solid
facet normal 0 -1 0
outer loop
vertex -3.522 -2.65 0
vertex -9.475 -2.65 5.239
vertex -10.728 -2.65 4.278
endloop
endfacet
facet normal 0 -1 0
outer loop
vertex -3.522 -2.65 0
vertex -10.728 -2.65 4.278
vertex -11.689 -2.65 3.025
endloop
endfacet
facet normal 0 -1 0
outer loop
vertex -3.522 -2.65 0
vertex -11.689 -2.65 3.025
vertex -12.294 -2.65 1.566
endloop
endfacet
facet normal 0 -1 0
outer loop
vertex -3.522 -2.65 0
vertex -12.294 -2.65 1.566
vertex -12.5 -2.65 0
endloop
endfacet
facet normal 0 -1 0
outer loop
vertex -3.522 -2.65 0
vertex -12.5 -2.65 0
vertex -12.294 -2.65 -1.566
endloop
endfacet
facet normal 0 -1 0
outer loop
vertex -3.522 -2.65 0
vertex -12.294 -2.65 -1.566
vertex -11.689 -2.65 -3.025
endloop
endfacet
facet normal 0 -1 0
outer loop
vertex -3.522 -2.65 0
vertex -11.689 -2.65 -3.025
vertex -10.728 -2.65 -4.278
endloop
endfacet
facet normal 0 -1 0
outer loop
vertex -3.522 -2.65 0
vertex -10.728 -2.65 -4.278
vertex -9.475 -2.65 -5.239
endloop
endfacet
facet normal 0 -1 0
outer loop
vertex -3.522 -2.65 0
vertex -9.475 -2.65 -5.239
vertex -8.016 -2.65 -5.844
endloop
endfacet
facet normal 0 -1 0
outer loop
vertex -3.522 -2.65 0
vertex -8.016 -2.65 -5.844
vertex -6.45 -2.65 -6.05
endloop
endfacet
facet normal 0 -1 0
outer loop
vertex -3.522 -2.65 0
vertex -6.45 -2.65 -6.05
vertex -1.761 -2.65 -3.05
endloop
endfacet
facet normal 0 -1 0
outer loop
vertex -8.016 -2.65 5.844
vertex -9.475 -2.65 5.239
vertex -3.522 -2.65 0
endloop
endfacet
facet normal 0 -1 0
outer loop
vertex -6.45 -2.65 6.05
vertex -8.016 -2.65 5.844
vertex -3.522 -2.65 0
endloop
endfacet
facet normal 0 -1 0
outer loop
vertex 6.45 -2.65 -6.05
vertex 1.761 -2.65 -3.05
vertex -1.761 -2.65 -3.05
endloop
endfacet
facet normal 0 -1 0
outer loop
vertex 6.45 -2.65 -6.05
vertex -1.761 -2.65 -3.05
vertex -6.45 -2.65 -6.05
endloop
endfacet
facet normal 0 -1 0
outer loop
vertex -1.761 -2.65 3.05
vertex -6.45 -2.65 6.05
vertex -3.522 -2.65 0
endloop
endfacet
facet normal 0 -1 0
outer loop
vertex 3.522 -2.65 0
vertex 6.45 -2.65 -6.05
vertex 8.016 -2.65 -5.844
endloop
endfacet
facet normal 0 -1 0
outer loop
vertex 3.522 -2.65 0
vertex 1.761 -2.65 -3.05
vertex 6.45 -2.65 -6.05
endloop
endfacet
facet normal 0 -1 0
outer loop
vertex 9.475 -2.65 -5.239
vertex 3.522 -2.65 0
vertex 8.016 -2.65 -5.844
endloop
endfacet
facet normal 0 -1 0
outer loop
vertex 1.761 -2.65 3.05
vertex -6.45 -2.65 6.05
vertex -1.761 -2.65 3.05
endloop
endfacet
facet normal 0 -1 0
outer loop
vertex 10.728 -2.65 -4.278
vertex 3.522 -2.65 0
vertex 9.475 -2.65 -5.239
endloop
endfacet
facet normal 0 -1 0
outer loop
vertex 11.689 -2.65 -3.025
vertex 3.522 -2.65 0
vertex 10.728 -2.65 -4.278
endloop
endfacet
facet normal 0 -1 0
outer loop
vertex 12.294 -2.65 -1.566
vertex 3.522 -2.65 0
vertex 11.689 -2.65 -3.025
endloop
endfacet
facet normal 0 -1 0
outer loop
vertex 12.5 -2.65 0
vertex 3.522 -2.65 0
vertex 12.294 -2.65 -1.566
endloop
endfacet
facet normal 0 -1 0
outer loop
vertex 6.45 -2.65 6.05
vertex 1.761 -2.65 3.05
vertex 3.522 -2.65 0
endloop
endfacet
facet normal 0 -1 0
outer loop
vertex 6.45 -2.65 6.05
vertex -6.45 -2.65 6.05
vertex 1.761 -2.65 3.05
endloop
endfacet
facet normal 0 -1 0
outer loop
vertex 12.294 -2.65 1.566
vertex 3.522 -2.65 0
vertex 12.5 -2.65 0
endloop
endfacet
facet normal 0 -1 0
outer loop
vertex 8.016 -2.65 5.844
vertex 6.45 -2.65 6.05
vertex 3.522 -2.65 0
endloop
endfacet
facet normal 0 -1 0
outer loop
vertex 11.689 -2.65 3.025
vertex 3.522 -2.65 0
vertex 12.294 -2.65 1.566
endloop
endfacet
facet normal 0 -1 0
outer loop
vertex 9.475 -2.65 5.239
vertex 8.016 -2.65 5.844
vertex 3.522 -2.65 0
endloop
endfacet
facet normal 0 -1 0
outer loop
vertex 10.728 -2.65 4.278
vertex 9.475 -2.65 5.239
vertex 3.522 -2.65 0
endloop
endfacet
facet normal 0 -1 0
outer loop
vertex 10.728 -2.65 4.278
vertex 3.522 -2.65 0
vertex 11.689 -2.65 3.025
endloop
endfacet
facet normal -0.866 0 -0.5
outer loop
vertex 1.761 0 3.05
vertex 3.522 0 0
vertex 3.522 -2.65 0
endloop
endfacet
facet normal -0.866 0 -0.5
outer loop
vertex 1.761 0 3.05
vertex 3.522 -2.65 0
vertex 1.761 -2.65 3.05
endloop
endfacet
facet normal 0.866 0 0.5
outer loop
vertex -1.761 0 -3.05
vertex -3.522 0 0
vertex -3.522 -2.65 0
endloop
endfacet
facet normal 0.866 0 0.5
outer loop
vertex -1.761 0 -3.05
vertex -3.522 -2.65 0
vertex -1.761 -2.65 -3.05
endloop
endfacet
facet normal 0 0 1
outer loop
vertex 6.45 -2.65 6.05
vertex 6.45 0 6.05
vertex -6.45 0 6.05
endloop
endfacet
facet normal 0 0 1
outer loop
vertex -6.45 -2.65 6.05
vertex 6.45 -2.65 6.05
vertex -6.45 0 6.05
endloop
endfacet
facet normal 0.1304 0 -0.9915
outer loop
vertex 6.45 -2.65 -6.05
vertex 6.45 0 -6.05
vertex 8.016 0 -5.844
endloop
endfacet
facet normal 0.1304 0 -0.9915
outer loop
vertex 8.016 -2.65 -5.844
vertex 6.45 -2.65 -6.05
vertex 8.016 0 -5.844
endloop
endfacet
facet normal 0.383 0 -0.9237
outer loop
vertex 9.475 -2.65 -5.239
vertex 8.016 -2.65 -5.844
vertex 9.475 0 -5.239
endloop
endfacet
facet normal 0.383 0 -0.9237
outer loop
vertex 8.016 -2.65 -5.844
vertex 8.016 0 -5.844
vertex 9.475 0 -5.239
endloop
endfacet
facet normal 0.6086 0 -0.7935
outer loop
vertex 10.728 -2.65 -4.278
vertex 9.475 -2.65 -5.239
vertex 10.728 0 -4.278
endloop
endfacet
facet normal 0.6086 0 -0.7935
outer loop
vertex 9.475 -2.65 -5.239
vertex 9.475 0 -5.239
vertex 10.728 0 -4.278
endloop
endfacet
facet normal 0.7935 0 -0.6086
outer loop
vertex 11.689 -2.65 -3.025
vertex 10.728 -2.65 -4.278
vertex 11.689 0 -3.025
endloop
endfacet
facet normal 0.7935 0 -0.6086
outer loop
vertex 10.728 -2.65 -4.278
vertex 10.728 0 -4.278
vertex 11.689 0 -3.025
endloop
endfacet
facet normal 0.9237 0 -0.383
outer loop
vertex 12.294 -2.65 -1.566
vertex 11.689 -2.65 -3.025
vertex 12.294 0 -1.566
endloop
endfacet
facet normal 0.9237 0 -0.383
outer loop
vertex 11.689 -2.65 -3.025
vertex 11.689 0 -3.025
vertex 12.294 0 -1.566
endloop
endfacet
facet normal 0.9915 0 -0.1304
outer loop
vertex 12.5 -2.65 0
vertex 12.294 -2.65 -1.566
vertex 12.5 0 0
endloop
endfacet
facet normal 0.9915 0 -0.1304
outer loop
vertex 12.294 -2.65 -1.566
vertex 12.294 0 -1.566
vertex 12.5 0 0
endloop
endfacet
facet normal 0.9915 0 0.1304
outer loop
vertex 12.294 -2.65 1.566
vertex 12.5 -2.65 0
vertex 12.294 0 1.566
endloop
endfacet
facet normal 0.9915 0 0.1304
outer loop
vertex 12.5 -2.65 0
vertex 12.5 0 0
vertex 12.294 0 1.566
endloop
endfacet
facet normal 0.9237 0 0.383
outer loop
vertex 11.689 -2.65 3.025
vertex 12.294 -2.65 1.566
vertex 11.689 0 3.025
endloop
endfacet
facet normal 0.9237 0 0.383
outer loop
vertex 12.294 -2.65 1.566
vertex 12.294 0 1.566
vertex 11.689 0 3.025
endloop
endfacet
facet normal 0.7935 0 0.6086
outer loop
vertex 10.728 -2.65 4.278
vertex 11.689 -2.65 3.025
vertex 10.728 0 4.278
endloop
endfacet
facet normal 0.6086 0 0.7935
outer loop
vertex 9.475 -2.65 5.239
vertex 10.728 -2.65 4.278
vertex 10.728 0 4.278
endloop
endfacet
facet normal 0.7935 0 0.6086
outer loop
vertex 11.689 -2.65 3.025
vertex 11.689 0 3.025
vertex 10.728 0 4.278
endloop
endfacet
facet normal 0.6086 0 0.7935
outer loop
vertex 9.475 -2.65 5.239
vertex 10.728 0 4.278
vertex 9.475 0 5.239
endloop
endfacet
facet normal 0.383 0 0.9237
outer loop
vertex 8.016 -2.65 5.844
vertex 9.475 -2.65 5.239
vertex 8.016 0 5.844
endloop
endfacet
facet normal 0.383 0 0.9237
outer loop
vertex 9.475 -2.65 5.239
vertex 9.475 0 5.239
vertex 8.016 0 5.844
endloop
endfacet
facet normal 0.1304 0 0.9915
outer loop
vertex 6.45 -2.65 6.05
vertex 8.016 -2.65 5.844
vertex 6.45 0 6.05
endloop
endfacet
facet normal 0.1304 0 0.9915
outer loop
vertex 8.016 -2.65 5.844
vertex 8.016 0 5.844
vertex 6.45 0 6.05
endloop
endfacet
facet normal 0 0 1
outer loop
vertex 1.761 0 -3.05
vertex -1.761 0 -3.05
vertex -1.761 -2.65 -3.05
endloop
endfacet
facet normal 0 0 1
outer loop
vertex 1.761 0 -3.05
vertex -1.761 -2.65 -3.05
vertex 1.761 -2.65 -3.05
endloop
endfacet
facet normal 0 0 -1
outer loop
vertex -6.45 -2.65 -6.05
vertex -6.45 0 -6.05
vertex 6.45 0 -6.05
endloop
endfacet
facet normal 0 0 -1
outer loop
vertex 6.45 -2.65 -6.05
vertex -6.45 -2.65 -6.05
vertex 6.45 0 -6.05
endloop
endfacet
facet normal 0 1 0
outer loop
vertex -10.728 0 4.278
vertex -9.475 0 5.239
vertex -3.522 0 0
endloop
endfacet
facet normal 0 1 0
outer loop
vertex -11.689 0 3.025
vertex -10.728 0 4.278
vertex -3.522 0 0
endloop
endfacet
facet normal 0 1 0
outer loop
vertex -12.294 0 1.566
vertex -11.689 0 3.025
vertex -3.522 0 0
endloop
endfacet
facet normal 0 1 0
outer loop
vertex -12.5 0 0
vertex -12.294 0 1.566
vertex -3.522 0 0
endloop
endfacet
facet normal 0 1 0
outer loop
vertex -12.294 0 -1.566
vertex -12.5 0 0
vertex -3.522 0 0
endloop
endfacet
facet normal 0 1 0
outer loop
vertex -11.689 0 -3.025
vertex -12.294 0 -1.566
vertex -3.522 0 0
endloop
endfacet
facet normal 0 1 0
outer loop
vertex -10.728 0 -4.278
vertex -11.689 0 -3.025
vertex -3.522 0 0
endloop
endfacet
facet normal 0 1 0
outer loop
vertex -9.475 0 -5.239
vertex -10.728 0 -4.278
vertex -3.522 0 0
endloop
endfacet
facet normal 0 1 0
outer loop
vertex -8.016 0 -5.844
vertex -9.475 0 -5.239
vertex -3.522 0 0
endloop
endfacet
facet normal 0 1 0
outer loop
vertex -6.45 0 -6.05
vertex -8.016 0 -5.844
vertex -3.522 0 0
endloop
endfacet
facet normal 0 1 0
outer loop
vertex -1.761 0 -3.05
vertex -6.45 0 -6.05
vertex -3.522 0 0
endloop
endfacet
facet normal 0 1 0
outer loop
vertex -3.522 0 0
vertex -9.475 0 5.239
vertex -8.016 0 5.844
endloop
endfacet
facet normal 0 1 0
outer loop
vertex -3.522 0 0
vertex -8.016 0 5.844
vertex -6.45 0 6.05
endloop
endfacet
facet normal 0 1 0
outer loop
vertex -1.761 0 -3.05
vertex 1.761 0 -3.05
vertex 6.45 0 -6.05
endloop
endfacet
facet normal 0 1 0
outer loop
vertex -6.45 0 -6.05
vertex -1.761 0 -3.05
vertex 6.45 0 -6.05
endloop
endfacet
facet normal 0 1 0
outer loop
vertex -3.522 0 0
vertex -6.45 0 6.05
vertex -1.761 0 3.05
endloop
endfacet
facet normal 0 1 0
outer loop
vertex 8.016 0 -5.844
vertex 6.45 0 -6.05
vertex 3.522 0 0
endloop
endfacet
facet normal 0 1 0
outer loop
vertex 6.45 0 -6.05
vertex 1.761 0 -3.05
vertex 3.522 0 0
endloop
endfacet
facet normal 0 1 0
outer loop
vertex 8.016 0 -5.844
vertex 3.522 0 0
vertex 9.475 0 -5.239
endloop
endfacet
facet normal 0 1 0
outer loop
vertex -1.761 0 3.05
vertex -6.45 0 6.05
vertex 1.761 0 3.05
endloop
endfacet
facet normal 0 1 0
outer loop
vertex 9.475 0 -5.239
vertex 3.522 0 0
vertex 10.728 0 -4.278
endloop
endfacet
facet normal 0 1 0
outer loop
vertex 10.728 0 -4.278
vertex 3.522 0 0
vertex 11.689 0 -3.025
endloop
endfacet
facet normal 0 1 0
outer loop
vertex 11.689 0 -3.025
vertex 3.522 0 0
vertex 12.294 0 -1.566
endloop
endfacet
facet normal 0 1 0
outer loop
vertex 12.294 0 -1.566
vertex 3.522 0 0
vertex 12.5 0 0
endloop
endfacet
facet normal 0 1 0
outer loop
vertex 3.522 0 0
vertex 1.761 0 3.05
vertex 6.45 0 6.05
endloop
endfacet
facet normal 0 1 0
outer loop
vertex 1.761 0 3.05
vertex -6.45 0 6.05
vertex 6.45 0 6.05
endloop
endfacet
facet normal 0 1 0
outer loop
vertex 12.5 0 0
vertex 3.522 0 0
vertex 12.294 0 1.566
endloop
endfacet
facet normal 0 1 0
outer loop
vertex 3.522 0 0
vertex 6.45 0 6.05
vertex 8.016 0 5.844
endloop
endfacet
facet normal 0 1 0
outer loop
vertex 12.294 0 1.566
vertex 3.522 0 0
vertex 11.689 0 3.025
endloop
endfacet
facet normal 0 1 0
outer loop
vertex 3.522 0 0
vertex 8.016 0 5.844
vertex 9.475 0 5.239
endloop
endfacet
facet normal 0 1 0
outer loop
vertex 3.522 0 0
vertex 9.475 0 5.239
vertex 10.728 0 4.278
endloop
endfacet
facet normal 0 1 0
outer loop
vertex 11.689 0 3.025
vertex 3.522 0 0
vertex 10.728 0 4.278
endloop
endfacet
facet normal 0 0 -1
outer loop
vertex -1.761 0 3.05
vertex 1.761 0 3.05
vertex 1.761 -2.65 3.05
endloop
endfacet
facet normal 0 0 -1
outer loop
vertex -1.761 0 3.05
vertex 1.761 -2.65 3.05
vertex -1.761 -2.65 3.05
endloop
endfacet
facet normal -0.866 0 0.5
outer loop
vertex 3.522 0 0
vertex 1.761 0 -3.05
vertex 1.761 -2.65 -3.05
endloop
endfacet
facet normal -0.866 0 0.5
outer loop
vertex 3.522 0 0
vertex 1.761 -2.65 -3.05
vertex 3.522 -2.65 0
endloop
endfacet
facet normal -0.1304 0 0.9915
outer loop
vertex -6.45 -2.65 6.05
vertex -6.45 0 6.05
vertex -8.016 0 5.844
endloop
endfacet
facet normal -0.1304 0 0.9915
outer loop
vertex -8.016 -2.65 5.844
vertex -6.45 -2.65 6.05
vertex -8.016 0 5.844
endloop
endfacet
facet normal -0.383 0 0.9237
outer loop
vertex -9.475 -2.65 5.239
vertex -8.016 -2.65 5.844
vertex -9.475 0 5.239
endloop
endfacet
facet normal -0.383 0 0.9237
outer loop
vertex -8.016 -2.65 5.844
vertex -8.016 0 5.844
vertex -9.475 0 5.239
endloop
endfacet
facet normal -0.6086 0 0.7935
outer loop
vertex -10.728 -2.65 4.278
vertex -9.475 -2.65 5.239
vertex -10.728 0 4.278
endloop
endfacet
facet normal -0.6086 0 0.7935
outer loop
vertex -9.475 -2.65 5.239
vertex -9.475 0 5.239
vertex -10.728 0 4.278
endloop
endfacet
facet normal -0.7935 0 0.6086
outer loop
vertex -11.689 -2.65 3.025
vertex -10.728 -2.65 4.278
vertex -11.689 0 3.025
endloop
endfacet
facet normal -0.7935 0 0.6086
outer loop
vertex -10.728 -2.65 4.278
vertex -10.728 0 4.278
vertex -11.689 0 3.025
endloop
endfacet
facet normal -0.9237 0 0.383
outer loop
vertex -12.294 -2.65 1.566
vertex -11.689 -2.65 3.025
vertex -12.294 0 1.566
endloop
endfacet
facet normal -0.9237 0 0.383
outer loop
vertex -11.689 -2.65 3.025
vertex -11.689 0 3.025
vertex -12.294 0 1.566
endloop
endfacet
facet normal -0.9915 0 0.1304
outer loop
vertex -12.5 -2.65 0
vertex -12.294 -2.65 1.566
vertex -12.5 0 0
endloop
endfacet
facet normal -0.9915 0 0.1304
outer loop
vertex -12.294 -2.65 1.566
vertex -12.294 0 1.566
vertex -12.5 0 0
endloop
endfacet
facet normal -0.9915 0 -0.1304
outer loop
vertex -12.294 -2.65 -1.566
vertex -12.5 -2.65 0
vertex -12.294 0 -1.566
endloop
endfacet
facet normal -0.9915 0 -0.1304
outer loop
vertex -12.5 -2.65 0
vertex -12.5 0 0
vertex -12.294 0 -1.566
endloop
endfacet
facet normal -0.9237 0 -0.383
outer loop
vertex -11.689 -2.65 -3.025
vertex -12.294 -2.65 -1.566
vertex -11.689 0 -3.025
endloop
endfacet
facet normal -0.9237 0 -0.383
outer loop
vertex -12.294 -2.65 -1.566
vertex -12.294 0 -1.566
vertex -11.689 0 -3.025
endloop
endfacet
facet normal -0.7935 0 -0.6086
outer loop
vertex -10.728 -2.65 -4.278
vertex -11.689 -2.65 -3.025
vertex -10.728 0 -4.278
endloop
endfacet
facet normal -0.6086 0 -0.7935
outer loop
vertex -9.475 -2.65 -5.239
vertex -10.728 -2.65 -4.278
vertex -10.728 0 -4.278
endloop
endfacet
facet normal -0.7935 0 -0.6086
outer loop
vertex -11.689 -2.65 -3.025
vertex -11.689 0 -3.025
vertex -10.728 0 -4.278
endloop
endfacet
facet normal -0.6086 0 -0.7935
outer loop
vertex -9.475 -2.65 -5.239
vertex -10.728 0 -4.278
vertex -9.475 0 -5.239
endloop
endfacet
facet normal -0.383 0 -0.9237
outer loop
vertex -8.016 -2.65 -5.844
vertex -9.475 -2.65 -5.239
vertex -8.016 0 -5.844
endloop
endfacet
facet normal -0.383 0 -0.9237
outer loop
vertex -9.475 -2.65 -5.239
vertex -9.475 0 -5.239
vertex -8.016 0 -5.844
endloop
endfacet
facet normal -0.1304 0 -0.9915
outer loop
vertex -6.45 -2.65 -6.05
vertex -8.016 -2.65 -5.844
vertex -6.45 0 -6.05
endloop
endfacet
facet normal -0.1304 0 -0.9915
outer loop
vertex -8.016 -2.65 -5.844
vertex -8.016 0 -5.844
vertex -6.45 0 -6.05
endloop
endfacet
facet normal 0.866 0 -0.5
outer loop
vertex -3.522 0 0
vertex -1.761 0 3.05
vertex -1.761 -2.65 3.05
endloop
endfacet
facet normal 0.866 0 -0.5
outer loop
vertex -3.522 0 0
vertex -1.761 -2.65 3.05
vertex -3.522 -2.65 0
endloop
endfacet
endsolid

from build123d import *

# Parameters (mm, degrees)
PAD_DEPTH = 2.65


with BuildPart() as part:
    # Sketch → Pad (new body)
    with BuildSketch(Plane.XZ):
        with BuildLine():
            ThreePointArc((-6.45, 6.05), (-12.5, 0), (-6.45, -6.05))
            Line((-6.45, -6.05), (6.45, -6.05))
            ThreePointArc((6.45, -6.05), (12.5, 0), (6.45, 6.05))
            Line((6.45, 6.05), (-6.45, 6.05))
        make_face()
        Polygon((1.760918, 3.05), (-1.760918, 3.05), (-3.521837, 0), (-1.760918, -3.05), (1.760918, -3.05), (3.521837, 0), align=None, mode=Mode.SUBTRACT)
    extrude(amount=PAD_DEPTH)


solid = part.part
